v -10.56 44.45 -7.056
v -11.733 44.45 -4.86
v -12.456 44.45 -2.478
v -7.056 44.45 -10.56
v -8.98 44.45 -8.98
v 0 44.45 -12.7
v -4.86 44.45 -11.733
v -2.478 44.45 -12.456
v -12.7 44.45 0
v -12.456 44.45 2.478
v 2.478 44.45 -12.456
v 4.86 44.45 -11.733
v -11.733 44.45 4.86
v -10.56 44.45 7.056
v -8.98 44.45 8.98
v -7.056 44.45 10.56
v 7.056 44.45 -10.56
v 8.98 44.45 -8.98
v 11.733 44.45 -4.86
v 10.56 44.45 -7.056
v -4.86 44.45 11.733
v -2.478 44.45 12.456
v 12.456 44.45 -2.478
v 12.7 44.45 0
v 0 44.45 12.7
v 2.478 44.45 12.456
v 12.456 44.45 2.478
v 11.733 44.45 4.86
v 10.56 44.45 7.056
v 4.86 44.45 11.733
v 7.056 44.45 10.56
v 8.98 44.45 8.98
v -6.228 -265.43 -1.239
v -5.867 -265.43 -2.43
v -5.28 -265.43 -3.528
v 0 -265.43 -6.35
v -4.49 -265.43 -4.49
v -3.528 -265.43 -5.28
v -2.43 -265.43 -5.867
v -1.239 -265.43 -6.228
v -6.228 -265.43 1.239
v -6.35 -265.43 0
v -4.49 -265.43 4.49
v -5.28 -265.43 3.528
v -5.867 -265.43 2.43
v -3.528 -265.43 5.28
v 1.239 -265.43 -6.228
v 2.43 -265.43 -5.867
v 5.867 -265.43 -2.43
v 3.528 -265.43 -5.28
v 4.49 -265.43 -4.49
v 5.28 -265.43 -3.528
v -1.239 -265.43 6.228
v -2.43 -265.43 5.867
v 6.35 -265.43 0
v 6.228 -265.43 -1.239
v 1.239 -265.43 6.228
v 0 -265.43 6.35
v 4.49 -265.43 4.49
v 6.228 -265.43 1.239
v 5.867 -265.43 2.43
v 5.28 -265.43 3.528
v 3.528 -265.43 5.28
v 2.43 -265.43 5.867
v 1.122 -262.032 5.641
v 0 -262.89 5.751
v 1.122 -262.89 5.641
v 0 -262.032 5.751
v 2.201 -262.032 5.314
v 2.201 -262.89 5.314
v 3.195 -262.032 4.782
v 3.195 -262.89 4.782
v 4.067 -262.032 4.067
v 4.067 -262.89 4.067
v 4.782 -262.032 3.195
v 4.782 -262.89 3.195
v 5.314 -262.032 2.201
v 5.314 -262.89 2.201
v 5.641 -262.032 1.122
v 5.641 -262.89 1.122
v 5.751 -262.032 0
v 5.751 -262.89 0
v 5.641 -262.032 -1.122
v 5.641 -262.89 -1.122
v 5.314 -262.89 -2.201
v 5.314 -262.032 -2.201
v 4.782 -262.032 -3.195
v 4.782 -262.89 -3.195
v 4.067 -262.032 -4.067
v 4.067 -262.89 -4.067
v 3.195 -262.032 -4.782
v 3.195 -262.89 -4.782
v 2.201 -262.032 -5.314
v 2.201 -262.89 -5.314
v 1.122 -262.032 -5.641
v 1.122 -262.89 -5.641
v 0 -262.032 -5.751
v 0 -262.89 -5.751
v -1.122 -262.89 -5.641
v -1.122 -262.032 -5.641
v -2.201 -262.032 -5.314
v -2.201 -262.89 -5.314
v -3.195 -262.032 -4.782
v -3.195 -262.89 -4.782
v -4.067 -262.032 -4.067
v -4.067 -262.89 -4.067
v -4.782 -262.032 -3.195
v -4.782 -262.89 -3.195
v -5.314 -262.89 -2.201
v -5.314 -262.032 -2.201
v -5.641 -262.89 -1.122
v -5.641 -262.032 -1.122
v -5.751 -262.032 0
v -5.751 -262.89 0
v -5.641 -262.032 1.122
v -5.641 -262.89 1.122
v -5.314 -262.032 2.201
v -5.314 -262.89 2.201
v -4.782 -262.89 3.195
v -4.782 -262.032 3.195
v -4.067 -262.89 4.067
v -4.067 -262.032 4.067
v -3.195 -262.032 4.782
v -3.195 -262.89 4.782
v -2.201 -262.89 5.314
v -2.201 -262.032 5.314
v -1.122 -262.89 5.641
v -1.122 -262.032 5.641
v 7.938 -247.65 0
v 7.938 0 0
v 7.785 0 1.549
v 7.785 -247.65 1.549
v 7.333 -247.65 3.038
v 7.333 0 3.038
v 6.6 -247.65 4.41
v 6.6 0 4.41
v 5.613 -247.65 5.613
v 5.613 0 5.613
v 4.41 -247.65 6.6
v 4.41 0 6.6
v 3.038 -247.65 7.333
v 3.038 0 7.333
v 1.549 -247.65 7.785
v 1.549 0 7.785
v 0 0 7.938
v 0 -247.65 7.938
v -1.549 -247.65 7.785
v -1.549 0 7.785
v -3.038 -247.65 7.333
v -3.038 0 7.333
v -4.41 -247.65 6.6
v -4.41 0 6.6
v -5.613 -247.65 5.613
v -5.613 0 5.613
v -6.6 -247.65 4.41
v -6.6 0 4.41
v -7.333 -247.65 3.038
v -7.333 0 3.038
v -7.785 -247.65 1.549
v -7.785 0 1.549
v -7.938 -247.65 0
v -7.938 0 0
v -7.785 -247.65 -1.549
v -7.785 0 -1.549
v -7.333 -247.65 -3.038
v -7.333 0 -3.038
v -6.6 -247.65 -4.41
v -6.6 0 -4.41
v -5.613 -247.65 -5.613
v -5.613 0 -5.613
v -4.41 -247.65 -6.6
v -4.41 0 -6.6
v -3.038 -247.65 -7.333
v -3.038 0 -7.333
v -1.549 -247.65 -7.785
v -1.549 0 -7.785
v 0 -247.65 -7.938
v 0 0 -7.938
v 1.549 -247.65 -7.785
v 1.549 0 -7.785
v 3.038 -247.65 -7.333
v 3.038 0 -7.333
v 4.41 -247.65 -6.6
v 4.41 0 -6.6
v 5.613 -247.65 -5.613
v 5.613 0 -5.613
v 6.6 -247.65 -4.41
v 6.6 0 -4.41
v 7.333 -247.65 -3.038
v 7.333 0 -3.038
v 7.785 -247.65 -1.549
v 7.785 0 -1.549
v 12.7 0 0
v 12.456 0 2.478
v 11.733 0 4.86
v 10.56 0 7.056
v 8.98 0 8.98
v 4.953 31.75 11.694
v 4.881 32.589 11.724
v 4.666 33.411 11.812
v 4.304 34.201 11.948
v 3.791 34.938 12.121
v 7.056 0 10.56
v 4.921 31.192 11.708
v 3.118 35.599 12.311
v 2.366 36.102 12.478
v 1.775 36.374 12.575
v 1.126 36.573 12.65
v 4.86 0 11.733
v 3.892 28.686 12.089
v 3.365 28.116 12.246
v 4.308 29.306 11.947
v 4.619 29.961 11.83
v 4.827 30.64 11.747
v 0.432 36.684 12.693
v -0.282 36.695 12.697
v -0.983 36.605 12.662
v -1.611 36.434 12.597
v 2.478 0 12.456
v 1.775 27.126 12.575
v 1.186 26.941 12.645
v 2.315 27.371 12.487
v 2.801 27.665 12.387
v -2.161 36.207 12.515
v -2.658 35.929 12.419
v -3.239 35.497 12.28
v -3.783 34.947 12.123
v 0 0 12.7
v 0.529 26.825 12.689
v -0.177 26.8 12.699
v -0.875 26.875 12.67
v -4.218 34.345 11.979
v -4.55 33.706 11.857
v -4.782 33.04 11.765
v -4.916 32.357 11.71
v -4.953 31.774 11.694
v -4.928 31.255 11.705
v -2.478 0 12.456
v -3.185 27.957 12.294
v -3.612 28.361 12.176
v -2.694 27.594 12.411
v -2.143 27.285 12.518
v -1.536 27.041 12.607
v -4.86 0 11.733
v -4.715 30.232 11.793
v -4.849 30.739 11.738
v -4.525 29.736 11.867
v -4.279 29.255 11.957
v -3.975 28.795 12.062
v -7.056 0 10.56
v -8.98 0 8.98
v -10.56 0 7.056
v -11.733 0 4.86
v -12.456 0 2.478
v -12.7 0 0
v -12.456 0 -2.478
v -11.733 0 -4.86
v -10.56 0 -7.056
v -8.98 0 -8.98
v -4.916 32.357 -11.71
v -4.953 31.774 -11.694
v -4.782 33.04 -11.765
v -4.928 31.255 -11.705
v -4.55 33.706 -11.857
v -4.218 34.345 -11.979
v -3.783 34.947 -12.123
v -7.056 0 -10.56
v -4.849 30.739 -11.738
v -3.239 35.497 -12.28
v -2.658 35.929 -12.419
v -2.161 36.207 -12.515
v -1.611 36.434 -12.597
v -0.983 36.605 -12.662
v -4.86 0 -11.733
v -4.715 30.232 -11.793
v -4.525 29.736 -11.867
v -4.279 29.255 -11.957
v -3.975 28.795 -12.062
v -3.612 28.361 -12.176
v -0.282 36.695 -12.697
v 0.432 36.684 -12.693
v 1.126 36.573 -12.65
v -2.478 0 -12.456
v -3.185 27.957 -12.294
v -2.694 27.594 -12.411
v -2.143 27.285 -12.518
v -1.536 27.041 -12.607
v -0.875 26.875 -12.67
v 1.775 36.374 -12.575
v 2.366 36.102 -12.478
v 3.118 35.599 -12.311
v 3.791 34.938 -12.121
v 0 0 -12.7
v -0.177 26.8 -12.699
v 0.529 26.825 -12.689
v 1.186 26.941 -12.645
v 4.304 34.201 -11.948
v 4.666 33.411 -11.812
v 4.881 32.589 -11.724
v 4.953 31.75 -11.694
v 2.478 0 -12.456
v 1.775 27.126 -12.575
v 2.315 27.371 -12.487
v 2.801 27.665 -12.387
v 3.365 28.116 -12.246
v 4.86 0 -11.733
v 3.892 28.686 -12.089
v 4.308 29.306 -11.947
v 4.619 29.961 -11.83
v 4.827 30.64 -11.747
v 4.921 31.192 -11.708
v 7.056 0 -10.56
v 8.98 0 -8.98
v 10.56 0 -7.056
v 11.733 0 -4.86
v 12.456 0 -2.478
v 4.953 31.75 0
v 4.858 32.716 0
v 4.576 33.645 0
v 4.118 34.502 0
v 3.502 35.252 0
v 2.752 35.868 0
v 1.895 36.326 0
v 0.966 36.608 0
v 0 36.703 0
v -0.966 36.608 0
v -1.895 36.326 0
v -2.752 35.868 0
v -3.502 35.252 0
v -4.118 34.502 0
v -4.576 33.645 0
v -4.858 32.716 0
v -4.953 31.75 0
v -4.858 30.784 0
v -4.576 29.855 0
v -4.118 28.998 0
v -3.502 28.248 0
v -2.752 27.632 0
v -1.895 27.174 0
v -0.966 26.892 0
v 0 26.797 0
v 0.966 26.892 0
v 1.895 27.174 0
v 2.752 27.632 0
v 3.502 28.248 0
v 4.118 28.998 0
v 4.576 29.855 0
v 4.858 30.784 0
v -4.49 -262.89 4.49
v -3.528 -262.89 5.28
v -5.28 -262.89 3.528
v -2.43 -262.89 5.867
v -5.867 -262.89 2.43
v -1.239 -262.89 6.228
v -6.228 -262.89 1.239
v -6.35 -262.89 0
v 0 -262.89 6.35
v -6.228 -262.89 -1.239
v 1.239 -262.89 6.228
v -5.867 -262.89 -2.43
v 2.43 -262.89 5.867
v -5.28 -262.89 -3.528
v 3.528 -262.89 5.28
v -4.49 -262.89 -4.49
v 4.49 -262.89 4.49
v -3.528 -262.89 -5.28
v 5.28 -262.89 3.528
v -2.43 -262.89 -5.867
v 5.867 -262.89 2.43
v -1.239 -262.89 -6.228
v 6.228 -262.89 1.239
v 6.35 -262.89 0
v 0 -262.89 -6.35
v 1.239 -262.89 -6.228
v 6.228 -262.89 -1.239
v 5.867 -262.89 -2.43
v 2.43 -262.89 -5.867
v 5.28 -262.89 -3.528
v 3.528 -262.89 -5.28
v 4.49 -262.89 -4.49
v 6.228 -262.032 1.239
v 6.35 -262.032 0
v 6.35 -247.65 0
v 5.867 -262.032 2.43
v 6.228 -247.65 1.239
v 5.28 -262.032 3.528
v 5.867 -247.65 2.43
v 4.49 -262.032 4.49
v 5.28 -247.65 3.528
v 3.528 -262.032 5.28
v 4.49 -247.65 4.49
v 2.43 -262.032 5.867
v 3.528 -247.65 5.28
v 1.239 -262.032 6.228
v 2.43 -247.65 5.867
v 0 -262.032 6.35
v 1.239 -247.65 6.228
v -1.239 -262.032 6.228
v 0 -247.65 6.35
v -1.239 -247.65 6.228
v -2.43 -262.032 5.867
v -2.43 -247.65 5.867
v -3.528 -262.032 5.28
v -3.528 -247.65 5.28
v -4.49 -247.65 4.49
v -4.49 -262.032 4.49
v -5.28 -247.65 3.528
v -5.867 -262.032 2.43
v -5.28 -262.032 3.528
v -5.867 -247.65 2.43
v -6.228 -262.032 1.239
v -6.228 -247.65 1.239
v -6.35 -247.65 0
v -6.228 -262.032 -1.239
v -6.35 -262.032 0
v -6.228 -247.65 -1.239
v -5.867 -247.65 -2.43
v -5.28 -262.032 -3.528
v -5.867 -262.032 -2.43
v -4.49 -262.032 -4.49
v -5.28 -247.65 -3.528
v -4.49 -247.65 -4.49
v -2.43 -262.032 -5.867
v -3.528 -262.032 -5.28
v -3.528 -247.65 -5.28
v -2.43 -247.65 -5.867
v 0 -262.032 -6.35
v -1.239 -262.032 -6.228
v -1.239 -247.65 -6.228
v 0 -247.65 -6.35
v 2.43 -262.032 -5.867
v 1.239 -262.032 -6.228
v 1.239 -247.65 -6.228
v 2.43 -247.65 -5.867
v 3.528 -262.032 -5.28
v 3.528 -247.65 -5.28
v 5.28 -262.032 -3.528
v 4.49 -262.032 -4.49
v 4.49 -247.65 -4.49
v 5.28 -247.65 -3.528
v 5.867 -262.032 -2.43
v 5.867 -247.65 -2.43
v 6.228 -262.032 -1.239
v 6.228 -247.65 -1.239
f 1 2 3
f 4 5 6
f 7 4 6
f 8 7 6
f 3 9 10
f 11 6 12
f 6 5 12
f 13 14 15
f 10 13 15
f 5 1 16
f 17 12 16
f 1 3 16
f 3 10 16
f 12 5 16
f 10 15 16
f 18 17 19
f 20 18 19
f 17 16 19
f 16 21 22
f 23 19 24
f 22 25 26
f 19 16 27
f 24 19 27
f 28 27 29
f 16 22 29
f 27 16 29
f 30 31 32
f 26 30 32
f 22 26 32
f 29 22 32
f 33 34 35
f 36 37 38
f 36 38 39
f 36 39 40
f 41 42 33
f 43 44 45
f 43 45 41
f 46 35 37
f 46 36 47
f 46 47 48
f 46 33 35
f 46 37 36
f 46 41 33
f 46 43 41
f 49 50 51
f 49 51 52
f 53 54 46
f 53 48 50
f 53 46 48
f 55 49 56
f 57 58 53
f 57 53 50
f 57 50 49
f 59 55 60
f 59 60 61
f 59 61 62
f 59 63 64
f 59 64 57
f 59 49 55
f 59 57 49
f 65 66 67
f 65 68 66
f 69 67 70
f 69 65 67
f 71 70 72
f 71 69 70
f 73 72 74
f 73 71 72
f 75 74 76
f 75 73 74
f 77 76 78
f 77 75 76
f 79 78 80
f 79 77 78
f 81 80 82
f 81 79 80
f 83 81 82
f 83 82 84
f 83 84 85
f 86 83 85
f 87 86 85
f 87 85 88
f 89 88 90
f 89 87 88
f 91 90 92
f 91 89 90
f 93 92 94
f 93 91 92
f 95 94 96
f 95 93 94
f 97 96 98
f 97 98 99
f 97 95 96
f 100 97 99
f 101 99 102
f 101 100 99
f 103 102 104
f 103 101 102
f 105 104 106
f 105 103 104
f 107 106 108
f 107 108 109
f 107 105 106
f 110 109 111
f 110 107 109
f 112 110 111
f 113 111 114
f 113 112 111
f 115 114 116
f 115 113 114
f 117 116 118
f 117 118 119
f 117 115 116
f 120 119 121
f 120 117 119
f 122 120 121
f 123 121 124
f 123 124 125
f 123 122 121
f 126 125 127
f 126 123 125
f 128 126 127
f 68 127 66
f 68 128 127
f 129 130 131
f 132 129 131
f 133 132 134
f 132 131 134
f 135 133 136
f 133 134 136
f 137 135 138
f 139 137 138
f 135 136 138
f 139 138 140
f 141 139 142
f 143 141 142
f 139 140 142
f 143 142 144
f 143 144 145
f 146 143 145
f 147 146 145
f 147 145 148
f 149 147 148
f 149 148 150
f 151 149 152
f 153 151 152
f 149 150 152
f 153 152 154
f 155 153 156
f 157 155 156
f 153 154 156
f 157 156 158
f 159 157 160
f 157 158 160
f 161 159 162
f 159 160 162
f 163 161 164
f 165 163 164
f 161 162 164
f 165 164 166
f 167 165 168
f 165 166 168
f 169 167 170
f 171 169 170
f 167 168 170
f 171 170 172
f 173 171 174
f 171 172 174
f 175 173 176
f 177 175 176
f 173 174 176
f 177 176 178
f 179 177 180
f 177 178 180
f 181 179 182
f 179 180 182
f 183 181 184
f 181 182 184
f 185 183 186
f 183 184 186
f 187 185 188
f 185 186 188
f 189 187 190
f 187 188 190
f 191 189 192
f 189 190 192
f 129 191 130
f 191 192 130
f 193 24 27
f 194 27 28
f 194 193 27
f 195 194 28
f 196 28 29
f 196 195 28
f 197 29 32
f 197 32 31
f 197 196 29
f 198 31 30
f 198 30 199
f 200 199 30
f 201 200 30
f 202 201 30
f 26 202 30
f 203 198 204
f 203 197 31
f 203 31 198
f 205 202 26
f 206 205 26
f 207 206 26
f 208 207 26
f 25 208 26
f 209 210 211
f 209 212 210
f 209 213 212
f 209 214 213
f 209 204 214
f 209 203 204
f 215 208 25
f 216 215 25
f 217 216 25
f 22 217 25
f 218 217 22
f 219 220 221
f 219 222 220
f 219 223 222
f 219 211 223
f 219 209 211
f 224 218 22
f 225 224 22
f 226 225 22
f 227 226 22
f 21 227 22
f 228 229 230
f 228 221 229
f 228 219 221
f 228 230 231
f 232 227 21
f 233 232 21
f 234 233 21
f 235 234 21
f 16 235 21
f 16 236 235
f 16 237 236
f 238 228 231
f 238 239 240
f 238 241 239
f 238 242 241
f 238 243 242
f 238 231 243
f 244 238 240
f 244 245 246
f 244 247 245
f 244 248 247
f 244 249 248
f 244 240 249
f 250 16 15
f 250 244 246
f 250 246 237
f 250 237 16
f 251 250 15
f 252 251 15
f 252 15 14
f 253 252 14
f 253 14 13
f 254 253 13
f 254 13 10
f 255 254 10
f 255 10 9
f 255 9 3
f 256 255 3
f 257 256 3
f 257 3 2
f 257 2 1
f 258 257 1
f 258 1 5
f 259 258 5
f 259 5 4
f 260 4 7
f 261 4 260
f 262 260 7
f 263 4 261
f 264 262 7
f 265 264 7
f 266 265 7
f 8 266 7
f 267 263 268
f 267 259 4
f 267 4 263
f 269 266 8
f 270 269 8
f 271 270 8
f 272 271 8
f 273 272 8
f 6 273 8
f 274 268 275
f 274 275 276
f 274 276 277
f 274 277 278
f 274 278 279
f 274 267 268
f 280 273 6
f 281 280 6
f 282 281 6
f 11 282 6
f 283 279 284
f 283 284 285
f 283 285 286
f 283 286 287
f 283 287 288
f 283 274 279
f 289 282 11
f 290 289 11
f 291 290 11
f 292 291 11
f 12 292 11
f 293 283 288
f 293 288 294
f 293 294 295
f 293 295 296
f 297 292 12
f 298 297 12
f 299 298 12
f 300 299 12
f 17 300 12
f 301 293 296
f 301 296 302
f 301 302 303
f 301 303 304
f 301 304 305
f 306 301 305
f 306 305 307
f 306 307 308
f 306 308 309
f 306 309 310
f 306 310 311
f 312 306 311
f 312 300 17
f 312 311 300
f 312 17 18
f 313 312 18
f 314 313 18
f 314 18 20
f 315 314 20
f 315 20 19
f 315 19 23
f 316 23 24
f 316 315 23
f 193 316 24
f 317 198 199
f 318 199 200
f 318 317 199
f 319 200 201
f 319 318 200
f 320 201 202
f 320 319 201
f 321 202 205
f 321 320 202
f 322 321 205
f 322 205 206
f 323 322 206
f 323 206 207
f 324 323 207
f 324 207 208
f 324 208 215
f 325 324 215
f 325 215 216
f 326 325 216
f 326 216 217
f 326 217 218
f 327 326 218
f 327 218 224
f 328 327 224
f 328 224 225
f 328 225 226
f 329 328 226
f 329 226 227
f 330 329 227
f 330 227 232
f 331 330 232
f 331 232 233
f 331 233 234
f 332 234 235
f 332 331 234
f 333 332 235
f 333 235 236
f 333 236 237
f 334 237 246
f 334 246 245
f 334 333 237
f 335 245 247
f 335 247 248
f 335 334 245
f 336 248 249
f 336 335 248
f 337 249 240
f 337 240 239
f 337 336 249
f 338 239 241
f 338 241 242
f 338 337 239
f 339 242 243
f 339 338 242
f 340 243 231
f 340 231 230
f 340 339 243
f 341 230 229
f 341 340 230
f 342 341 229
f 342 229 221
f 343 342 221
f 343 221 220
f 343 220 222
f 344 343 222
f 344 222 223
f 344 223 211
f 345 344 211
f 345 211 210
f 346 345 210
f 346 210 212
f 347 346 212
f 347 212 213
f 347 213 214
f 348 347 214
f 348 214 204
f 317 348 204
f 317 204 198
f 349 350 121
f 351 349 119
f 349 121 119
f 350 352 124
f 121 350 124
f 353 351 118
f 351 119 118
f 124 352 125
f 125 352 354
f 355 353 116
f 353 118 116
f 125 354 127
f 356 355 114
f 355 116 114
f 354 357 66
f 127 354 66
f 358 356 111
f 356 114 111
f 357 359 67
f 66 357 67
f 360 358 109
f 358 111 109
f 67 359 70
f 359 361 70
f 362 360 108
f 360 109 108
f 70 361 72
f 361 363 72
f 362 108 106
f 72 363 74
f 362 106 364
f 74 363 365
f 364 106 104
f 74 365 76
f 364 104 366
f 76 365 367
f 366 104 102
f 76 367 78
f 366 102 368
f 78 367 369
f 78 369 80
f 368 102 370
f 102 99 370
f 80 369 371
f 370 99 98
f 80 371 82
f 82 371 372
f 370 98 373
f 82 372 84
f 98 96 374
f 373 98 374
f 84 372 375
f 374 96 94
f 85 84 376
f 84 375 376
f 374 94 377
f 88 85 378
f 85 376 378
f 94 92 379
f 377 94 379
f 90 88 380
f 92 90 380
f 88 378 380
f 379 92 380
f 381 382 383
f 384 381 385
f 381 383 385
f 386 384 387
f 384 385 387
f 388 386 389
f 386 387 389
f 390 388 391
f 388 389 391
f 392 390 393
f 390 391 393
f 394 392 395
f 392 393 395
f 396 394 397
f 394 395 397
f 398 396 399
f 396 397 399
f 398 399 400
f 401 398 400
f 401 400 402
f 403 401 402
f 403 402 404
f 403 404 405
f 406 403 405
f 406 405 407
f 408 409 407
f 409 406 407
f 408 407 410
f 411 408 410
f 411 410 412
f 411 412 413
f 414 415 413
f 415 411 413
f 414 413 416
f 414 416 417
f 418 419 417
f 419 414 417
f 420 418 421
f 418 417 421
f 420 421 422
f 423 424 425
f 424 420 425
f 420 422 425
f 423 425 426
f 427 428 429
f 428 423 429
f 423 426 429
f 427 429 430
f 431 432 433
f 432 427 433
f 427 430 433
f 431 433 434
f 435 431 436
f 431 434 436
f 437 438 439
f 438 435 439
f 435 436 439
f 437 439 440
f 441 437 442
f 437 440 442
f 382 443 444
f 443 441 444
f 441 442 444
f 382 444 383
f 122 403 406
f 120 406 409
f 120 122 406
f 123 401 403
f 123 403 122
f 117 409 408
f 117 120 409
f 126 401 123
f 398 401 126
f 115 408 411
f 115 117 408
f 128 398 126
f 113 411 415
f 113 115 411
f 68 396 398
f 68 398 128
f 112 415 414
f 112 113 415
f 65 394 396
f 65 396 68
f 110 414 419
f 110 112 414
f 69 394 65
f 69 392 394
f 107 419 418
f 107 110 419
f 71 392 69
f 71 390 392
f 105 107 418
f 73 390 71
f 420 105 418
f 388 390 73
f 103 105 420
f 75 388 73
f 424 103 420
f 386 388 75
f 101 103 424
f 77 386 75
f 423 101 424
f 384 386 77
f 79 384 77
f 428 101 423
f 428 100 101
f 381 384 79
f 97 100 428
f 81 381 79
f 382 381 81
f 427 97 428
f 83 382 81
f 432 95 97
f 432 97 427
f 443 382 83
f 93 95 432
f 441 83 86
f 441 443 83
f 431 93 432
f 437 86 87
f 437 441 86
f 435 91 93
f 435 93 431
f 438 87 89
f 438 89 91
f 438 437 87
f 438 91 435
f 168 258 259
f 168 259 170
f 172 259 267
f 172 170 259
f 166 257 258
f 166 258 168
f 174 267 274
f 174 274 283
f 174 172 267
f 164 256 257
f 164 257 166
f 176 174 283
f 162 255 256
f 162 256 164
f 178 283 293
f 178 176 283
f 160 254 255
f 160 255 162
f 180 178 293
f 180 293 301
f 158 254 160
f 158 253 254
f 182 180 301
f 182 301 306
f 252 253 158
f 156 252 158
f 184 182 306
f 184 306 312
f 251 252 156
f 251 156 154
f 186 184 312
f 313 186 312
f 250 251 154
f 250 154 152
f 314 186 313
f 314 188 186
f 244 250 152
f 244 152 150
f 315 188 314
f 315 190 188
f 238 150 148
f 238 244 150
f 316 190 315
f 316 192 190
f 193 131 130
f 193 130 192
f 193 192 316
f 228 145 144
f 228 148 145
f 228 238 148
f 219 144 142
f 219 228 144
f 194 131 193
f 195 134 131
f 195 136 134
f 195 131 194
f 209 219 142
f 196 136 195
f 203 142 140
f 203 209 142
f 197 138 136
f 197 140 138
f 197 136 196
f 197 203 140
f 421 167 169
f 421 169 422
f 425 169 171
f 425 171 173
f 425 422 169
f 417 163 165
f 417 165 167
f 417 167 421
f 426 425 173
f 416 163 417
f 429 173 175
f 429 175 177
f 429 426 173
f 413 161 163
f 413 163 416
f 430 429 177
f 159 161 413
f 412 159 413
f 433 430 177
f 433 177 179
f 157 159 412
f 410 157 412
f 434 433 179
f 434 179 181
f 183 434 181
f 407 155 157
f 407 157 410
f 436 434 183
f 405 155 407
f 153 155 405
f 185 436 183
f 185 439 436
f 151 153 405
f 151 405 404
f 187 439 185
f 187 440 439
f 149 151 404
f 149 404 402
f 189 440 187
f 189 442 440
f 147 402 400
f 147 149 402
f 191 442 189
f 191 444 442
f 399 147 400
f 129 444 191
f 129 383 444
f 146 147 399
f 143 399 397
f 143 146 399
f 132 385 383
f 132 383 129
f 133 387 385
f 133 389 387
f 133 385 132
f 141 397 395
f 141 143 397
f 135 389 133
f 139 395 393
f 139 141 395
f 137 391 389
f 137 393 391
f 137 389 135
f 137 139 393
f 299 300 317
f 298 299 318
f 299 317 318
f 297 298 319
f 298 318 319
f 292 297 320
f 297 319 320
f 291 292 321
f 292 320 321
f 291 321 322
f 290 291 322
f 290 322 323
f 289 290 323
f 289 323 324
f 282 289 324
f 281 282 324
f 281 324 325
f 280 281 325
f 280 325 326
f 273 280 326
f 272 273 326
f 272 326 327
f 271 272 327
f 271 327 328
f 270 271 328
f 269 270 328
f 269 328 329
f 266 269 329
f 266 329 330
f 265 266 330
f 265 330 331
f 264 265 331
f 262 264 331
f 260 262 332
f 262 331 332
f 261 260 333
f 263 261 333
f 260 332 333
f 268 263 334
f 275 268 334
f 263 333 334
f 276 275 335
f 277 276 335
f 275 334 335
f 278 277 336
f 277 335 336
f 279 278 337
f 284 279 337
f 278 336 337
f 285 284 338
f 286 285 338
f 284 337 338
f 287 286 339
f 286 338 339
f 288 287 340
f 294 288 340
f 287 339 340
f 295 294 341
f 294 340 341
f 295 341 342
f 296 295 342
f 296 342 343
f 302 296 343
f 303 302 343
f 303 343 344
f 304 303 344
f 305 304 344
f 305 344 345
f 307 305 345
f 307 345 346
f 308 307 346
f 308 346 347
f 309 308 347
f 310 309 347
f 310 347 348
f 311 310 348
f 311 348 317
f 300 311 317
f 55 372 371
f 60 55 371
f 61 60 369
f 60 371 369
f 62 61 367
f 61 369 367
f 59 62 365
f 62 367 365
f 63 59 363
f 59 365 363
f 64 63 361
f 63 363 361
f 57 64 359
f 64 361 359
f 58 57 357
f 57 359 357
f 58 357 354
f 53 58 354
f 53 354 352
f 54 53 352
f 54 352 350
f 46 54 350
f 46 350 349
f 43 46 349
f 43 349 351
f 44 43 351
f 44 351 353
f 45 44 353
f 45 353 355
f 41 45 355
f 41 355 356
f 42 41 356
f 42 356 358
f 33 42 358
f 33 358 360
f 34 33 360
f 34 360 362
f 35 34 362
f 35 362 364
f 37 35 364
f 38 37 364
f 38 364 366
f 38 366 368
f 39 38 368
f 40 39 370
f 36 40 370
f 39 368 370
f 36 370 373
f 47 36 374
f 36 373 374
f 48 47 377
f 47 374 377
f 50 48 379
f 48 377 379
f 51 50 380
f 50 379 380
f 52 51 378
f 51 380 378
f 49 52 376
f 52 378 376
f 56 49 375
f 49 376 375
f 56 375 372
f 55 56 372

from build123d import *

# Parameters (mm, degrees)
F0_R          = 12.7
F1_DEPTH      = 44.45
F2_R          = 7.9375
F3_DEPTH      = 247.65
F4_R          = 6.35
F5_DEPTH      = 17.78
F6_W          = 0.8584746265
F6_H          = 1.4799516648
F8_R          = 4.953
F9_DEPTH      = 25.4
F9_DEPTH_BACK = 25.4


with BuildPart() as f1:
    # F0 (on Front) → F1 (new body)
    with BuildSketch(Plane.XZ):
        Circle(F0_R)
    extrude(amount=-F1_DEPTH)

    # F2 (on face) → F3 (join)
    with BuildSketch(Plane.XZ):
        Circle(F2_R)
    extrude(amount=F3_DEPTH)

    # F4 (on face) → F5 (join)
    with BuildSketch(Plane.XZ.offset(247.65)):
        Circle(F4_R)
    extrude(amount=F5_DEPTH)

    # F6 (on Right) → F7 (revolve, cut)
    with BuildSketch(Plane.YZ):
        with Locations((-262.4607626867, 6.4914319664)):
            Rectangle(F6_W, F6_H)
    revolve(axis=Axis((0, -260.4791074991, 0), (0, 1, 0)), mode=Mode.SUBTRACT)

    # F8 (on Top) → F9 (cut, two sides)
    with BuildSketch(Plane.XY) as f9_sk:
        with Locations((0, 31.75)):
            Circle(F8_R)
    extrude(amount=-F9_DEPTH, mode=Mode.SUBTRACT)
    extrude(f9_sk.sketch, amount=F9_DEPTH_BACK, mode=Mode.SUBTRACT)


solid = f1.part
